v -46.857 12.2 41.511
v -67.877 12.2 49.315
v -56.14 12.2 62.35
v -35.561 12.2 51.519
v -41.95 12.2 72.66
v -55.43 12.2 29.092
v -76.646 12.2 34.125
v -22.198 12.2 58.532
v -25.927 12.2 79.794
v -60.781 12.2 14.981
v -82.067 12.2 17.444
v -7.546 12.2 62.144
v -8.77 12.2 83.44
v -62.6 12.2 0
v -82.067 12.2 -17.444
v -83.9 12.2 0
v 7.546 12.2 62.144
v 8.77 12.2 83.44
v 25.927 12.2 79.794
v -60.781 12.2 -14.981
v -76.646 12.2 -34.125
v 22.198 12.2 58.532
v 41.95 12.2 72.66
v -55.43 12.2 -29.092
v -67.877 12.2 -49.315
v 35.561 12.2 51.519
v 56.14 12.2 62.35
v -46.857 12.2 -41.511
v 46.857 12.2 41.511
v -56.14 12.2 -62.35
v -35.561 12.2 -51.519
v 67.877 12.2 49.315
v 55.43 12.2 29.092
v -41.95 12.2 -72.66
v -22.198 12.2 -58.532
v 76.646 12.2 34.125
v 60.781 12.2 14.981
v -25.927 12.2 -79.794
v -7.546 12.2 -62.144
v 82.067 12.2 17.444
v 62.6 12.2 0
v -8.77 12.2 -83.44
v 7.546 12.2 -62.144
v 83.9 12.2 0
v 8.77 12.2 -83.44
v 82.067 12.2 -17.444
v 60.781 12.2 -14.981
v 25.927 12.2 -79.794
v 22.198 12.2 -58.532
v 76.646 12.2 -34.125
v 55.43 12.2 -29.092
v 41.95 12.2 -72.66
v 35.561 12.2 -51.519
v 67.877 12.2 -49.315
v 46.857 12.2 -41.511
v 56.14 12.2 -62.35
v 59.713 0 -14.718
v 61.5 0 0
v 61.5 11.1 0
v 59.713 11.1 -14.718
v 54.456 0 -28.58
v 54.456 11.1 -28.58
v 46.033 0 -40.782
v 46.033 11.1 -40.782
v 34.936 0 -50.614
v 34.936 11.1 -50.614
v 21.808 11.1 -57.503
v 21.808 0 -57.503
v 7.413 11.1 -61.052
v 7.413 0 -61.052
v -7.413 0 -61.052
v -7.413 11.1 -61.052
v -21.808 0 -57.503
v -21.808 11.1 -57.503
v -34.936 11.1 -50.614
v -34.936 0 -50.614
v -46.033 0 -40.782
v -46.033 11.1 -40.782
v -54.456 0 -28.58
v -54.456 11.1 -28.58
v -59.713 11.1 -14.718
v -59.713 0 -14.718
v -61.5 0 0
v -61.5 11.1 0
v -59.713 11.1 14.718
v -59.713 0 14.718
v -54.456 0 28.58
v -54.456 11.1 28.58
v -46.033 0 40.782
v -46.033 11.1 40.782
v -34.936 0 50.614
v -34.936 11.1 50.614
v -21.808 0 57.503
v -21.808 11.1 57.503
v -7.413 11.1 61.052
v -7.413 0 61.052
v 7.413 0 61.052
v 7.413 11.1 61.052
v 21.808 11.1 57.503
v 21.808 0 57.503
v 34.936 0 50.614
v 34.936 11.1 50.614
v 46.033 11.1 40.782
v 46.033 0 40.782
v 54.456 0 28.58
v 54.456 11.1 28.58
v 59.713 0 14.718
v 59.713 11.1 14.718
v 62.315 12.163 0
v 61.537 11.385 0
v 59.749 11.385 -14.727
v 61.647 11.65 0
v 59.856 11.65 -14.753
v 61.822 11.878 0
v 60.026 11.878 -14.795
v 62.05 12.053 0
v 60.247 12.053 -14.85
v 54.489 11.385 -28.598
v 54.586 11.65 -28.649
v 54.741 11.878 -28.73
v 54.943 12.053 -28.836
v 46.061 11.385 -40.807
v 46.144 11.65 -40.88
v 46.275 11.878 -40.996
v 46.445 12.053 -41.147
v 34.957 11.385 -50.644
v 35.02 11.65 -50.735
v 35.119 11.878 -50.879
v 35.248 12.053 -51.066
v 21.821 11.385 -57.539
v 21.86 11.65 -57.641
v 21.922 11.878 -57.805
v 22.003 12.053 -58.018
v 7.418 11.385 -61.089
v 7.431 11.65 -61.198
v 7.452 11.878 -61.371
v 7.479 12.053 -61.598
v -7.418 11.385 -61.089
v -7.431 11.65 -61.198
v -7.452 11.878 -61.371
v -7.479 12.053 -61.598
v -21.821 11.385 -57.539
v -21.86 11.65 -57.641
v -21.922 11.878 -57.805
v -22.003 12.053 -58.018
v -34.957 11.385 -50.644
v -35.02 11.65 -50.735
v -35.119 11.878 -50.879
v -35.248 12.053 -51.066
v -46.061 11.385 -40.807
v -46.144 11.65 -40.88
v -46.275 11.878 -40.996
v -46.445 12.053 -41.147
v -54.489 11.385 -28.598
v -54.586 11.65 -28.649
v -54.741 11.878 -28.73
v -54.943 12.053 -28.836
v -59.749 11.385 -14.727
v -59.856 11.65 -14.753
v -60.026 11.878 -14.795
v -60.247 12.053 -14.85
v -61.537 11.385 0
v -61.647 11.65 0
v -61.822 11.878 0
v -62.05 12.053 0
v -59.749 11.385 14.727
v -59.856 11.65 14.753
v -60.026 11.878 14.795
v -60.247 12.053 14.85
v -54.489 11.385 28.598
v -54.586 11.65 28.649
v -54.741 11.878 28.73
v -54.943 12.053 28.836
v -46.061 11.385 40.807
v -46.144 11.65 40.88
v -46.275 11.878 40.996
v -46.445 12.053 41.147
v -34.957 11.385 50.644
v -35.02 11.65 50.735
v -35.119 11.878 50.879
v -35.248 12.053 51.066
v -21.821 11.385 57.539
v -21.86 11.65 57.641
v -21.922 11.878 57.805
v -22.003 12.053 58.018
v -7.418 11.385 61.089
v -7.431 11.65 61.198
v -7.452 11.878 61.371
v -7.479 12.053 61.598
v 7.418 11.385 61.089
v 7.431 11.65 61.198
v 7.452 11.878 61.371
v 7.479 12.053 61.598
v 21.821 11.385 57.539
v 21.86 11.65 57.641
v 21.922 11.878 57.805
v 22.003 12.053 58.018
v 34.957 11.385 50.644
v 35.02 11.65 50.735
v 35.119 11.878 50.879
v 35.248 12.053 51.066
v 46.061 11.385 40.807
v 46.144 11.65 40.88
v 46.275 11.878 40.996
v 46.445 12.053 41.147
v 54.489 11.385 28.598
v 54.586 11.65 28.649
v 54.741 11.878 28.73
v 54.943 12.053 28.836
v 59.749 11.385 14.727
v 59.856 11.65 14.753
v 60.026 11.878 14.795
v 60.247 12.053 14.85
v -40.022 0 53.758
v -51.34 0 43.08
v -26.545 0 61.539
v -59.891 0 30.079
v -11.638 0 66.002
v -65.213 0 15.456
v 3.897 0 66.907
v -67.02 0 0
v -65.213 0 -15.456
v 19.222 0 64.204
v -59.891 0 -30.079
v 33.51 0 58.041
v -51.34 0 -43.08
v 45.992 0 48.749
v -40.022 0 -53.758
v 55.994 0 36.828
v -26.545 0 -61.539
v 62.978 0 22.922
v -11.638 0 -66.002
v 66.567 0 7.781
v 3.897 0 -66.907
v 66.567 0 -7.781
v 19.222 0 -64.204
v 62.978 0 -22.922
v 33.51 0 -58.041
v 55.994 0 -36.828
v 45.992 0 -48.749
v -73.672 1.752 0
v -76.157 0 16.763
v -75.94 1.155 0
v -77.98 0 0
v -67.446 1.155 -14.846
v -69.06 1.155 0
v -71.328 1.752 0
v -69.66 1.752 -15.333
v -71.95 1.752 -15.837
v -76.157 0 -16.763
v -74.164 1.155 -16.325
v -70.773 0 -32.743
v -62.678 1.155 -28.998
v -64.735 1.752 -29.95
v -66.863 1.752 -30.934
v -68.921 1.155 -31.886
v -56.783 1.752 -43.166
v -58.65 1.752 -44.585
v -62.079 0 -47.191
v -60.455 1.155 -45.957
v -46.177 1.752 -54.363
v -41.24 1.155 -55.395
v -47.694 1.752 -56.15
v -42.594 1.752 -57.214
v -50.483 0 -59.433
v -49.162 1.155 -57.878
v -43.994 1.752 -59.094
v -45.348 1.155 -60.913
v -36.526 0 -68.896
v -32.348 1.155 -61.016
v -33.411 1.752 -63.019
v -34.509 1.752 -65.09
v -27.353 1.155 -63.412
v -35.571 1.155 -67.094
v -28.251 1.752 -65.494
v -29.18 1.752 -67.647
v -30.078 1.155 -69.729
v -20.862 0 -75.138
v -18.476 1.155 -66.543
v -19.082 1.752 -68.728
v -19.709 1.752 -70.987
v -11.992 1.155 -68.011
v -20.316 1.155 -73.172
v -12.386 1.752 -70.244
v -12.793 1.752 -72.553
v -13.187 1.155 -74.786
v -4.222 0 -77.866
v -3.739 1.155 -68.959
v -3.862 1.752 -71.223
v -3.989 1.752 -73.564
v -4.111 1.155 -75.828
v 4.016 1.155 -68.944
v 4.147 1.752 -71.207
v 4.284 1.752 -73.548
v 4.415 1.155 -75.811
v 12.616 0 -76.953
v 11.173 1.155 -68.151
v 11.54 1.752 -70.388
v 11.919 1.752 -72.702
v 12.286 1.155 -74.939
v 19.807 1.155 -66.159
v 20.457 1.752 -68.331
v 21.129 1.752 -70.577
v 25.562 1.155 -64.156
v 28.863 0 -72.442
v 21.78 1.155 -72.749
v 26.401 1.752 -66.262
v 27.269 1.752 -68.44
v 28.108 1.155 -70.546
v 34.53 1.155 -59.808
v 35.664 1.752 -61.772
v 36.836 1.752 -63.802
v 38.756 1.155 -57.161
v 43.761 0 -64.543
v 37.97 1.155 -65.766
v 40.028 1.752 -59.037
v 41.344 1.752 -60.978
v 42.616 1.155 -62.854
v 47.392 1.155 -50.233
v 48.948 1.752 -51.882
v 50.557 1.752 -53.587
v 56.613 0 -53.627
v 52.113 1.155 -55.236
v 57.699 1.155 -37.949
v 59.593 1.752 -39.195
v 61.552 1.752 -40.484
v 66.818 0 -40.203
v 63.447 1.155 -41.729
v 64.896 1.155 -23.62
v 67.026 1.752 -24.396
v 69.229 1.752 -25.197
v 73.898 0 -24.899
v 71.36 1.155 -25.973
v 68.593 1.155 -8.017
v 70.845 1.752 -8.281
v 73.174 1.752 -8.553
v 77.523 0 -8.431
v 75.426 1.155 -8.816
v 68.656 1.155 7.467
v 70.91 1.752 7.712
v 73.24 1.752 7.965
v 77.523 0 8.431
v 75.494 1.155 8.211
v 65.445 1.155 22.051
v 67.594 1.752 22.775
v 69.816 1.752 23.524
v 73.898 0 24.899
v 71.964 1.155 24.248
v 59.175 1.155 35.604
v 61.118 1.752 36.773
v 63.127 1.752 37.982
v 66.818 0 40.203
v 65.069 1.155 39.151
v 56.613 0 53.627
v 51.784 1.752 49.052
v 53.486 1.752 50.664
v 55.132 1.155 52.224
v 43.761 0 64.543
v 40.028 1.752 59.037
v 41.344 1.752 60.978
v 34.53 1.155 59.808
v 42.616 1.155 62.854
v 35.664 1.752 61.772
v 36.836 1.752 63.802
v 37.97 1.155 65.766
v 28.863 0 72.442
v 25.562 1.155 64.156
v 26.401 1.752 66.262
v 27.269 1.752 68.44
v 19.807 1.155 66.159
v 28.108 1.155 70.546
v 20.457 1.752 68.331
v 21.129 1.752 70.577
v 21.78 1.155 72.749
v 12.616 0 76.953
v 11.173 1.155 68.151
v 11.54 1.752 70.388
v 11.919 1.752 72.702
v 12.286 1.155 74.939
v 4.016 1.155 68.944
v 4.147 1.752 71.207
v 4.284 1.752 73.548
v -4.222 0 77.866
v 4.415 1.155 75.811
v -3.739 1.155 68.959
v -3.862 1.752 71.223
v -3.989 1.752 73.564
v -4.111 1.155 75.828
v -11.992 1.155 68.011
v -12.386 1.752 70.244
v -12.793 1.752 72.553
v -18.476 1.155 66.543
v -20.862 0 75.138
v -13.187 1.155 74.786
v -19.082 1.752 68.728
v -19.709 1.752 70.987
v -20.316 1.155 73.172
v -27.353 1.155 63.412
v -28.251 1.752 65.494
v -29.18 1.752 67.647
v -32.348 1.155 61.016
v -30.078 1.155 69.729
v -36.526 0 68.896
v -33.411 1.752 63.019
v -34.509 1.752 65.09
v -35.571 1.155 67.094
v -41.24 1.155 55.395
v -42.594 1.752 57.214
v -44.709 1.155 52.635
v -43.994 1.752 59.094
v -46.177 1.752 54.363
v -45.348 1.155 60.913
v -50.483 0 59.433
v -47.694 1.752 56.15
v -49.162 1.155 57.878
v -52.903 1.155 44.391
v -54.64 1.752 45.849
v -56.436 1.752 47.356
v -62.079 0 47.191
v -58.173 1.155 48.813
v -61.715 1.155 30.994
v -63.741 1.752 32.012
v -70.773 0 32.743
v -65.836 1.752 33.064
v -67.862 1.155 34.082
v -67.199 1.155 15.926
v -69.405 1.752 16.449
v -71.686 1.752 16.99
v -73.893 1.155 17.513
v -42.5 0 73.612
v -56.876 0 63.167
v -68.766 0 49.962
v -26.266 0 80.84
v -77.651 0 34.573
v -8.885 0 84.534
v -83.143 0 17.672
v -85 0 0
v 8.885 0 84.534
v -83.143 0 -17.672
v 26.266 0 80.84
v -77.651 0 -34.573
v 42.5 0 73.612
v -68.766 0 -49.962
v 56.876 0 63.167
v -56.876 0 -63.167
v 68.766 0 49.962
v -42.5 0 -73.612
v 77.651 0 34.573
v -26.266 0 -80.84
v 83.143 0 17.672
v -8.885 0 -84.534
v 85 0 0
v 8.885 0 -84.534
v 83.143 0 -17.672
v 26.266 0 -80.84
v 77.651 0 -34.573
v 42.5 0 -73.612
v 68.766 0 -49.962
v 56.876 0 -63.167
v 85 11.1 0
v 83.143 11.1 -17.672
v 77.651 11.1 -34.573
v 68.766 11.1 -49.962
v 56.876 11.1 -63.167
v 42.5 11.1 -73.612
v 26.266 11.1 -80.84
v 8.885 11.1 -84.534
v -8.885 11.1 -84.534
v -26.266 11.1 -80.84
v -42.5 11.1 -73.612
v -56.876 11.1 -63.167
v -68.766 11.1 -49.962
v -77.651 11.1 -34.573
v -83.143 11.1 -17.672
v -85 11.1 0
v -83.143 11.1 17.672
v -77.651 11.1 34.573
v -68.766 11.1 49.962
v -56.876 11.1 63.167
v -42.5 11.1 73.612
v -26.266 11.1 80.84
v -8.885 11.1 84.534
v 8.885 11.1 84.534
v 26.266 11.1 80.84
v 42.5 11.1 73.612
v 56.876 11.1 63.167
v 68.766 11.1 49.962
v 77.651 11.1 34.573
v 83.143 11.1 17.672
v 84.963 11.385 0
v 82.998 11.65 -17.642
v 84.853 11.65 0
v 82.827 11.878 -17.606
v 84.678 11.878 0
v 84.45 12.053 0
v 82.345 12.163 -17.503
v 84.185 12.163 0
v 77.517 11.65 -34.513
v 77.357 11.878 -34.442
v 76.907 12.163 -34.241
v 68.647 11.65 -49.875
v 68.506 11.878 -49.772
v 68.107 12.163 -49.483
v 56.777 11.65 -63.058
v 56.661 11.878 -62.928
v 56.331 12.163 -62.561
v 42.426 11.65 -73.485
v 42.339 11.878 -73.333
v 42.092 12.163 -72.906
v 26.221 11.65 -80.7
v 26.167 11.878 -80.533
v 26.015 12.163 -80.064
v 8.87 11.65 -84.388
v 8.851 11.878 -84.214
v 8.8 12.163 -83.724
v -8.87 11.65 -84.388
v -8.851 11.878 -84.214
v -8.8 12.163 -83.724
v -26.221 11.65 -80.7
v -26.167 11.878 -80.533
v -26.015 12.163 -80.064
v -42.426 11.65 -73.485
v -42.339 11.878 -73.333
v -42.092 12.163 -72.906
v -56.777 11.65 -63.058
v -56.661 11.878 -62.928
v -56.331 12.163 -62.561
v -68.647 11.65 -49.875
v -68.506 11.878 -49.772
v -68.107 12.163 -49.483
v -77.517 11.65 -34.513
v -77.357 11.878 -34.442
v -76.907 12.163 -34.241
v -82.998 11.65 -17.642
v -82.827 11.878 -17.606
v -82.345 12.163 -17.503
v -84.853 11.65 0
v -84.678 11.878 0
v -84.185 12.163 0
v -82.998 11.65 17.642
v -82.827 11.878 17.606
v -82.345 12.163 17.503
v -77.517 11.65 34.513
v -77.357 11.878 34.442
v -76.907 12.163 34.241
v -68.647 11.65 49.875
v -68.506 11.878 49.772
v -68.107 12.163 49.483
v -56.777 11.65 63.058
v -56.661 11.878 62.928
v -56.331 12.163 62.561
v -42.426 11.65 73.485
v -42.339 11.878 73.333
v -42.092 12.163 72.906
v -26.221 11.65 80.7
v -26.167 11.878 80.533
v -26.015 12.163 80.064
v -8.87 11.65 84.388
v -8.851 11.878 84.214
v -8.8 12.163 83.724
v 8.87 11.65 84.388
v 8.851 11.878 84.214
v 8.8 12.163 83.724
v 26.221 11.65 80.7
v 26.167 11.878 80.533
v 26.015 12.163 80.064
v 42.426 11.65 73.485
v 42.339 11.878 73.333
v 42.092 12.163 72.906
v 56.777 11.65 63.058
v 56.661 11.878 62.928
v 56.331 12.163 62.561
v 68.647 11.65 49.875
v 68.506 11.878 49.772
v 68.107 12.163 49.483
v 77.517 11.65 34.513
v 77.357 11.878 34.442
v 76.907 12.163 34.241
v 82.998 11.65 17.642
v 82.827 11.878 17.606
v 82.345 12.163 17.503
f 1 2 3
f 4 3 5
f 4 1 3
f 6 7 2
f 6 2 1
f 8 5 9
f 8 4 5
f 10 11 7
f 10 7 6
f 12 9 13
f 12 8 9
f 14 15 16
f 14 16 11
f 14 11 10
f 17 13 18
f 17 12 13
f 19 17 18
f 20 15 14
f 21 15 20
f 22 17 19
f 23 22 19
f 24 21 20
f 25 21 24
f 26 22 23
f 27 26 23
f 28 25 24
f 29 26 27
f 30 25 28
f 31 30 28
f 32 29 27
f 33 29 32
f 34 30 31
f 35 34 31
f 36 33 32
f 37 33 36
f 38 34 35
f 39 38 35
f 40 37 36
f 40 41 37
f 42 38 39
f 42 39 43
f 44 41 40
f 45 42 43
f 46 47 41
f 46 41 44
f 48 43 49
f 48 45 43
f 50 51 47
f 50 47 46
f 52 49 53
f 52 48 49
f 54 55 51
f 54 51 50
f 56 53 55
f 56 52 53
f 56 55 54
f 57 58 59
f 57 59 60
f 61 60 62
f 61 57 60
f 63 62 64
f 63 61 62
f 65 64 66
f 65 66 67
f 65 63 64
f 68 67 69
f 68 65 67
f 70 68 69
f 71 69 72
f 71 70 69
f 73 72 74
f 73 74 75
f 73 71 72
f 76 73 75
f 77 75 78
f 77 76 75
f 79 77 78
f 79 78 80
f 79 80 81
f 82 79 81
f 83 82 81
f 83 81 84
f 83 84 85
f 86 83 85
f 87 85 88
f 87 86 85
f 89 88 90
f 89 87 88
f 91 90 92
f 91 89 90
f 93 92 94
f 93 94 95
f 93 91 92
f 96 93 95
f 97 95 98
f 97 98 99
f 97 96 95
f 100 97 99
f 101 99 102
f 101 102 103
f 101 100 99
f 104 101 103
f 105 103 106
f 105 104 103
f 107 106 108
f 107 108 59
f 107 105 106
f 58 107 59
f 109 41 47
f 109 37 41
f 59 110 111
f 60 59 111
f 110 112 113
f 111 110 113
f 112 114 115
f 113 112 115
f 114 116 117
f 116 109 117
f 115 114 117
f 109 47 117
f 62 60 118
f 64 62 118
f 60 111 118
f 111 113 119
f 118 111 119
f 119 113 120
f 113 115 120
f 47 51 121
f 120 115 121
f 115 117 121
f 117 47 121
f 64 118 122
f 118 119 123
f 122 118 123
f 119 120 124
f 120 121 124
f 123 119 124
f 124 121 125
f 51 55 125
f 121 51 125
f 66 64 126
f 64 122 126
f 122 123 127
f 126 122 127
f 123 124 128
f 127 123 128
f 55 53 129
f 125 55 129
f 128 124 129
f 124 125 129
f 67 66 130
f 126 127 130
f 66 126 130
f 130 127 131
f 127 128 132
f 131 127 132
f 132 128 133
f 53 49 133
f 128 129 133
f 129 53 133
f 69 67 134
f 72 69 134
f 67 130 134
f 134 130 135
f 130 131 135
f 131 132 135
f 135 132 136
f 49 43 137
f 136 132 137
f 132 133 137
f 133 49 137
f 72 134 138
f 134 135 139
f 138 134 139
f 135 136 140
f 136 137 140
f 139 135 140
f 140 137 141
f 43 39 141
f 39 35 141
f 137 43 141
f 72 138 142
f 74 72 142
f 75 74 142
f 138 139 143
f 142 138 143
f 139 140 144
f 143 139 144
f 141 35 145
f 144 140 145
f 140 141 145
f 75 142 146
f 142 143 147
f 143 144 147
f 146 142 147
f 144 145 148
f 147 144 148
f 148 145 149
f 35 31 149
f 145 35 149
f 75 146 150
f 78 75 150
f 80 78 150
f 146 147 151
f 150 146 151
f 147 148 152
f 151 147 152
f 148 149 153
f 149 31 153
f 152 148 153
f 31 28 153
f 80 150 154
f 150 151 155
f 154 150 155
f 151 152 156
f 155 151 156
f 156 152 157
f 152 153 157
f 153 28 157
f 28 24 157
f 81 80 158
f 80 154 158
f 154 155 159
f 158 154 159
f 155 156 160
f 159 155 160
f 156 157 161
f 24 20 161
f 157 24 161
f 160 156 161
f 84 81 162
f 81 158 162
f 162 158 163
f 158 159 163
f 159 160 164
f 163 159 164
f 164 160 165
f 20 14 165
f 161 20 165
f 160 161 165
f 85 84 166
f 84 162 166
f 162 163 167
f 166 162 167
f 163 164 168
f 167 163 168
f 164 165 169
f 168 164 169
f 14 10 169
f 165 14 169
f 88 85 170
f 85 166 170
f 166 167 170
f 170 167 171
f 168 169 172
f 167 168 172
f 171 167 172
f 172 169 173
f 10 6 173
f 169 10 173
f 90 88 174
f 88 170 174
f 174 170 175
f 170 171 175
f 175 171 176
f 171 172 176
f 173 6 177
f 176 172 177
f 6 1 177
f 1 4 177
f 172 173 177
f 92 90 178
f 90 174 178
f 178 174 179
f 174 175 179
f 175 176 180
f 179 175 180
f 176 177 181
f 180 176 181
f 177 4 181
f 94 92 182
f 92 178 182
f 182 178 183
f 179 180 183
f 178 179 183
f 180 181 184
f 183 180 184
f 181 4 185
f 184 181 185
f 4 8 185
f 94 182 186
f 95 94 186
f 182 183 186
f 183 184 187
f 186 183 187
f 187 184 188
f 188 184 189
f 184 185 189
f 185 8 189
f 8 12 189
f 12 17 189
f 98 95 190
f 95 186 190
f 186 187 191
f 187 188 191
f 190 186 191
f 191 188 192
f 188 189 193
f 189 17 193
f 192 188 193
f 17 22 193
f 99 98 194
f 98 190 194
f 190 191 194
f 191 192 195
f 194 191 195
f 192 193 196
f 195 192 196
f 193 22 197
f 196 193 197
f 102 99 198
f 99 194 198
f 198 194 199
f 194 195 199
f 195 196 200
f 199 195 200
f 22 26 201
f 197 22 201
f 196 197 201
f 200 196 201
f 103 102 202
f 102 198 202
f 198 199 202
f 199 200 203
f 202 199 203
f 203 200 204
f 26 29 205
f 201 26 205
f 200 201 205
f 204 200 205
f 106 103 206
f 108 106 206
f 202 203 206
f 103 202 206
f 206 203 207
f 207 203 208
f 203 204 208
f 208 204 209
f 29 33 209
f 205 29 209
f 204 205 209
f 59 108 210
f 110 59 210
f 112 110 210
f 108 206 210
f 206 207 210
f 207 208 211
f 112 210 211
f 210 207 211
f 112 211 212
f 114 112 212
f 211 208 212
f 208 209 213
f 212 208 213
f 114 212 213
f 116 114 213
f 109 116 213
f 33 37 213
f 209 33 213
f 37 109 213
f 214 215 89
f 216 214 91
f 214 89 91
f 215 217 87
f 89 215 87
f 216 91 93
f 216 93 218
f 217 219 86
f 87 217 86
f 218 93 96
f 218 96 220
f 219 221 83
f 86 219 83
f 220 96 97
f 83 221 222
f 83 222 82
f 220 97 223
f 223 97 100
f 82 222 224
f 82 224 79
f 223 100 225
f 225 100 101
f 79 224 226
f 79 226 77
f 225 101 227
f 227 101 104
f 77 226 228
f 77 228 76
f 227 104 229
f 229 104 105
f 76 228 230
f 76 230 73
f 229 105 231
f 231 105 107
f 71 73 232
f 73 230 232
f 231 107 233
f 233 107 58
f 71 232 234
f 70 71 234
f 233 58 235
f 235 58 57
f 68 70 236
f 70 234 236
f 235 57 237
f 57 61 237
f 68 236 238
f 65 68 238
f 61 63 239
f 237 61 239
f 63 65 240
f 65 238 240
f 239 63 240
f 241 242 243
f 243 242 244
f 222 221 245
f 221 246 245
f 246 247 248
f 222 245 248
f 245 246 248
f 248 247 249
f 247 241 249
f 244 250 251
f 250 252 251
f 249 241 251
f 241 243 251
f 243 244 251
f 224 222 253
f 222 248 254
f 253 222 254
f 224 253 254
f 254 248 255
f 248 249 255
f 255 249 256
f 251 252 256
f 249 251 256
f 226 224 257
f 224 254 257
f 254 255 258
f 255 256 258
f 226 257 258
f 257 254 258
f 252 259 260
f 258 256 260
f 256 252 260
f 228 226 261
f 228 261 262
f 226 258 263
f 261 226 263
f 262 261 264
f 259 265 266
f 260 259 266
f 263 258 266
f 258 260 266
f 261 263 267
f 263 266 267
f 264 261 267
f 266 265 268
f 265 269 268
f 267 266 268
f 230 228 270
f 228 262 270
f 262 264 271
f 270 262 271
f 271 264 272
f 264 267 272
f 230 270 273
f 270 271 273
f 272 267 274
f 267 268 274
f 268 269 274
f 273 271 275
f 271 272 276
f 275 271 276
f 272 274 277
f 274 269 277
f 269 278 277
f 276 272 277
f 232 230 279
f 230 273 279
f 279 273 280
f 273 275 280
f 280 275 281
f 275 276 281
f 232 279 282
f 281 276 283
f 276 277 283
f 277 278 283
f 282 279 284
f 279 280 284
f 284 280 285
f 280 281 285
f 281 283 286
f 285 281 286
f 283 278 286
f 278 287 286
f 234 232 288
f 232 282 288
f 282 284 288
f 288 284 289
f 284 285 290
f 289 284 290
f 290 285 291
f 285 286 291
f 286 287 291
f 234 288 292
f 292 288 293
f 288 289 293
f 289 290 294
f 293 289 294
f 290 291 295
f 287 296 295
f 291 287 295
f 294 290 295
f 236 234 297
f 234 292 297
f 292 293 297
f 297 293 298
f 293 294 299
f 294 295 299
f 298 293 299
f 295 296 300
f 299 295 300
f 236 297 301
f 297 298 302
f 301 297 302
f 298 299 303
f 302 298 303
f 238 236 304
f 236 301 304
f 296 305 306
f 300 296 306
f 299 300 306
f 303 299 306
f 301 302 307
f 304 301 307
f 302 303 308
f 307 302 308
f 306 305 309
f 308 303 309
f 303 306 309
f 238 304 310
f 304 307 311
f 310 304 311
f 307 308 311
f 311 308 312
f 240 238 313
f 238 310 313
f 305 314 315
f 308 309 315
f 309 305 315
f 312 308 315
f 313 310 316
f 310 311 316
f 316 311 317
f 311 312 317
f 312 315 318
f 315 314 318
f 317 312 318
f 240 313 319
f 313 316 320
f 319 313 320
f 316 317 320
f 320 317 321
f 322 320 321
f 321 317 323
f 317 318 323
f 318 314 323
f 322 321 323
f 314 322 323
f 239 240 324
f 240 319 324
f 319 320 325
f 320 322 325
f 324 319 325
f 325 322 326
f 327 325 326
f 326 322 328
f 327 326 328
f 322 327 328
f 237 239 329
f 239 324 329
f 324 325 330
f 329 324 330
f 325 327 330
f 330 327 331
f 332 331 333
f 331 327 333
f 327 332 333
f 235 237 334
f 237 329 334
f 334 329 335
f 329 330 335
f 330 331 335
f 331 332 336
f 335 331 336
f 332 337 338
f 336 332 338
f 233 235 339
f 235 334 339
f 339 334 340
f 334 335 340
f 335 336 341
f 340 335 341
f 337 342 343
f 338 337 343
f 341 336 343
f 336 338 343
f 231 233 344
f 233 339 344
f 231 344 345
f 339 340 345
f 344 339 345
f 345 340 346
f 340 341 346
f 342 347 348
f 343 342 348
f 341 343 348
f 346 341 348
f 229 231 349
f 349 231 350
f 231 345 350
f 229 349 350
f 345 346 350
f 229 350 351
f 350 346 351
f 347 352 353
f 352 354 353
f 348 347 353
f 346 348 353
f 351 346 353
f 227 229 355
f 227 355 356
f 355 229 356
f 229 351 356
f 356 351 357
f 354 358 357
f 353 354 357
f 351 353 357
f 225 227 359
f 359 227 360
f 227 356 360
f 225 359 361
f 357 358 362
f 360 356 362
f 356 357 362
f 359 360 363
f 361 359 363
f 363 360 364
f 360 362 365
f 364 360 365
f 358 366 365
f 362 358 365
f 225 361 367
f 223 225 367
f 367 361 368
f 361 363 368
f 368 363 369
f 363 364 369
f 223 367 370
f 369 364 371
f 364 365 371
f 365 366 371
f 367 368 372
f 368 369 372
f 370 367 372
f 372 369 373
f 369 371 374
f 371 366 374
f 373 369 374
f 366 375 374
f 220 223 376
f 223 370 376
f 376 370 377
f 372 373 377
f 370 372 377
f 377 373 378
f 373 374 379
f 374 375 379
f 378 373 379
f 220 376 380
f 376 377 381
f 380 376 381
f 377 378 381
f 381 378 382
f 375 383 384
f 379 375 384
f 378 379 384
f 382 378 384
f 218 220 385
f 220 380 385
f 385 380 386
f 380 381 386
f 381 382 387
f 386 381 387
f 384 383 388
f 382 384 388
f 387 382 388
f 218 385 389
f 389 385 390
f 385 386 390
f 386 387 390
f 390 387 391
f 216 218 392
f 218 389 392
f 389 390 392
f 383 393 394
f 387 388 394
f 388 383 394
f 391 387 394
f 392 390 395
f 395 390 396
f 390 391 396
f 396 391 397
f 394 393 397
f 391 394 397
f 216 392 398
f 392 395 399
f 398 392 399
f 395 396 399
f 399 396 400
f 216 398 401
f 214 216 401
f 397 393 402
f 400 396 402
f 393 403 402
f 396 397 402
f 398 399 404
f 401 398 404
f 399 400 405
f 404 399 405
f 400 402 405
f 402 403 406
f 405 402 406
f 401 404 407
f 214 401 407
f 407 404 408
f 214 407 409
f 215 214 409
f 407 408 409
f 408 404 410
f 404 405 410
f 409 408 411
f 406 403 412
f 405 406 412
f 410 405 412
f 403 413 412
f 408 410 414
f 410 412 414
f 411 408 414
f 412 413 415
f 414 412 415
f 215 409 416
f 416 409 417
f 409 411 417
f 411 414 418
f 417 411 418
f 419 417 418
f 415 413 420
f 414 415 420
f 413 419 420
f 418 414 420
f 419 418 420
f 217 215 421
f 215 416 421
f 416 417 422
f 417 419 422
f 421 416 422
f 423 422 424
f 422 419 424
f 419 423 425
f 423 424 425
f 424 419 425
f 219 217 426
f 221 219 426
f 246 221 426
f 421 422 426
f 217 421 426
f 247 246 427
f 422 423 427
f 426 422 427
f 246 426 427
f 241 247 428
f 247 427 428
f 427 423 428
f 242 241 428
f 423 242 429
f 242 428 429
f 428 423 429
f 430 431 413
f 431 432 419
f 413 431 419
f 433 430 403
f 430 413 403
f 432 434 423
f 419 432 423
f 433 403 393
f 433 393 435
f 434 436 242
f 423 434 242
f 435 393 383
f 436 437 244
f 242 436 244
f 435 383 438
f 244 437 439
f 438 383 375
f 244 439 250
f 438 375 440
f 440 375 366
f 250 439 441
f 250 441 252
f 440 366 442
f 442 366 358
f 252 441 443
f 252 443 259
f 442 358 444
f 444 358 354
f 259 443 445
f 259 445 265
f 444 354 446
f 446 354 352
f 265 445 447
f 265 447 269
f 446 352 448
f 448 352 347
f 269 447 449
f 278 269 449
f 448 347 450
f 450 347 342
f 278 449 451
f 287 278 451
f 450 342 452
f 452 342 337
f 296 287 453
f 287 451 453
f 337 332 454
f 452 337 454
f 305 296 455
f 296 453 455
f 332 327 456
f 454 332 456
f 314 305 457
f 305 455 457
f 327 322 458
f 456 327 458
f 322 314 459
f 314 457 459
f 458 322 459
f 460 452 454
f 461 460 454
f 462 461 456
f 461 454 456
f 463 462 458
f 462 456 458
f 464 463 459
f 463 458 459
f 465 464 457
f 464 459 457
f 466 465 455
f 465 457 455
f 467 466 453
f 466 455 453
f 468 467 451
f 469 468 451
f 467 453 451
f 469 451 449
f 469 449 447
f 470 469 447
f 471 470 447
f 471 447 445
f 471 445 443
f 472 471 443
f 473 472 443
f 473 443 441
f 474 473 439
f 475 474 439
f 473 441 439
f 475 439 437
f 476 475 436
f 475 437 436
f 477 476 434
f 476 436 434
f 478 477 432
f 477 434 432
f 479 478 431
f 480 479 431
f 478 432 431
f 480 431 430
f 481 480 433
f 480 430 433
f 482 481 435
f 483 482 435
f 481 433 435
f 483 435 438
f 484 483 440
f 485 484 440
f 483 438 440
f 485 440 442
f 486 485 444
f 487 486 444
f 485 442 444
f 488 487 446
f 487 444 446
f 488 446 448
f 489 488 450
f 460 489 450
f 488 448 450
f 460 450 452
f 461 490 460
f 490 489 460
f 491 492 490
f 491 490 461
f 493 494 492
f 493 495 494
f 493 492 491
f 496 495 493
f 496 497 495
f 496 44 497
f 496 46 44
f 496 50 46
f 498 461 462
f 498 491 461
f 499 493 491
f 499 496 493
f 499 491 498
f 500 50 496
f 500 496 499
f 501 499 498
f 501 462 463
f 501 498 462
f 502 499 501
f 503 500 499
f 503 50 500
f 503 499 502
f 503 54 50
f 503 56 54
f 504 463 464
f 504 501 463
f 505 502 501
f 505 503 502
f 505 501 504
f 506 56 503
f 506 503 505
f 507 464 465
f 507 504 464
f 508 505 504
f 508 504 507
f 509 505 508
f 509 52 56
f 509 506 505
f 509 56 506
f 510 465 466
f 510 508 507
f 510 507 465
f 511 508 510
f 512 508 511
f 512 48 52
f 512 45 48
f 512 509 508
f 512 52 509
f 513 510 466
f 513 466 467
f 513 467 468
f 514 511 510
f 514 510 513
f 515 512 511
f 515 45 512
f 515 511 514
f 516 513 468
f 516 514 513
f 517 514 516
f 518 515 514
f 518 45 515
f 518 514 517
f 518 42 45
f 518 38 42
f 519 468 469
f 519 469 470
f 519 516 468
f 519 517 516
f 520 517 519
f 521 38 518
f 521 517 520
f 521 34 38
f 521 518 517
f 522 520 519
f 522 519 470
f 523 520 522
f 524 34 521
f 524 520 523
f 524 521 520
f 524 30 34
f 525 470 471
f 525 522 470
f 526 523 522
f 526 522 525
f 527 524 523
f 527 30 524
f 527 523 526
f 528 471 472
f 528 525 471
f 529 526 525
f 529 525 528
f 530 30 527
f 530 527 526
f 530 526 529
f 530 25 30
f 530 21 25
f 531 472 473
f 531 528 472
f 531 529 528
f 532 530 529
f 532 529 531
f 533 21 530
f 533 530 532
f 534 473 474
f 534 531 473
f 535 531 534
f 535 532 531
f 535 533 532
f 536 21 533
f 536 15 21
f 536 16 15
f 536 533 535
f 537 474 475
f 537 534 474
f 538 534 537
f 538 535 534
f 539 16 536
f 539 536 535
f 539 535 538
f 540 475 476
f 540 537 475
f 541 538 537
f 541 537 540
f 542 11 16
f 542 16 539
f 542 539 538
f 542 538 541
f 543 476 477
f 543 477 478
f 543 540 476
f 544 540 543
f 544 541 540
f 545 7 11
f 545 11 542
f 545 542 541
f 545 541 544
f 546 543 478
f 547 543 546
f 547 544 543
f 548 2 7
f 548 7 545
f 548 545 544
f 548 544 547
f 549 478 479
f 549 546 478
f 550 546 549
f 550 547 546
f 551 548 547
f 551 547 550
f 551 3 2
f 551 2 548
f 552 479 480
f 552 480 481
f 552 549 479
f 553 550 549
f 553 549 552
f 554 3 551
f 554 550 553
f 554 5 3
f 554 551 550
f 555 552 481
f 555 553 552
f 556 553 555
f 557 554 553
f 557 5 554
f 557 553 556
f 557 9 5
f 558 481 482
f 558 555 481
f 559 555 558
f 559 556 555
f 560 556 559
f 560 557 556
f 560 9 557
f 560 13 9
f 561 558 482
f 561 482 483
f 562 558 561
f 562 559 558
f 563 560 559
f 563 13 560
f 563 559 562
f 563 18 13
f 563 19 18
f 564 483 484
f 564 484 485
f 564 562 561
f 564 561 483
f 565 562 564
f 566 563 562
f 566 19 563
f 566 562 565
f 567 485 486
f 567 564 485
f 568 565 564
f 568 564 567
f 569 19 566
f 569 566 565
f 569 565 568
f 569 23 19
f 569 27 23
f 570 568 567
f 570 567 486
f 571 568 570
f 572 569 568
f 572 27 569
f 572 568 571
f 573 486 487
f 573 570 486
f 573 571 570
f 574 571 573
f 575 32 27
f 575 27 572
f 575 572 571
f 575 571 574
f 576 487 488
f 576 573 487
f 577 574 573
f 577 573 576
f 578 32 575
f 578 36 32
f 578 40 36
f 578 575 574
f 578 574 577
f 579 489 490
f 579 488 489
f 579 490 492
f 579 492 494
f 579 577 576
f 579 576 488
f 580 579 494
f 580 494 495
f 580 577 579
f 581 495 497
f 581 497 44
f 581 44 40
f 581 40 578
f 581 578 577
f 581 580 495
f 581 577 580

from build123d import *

# Parameters (mm, degrees)
SKETCH1_R           = 85
SKETCH1_R_2         = 61.5
BOSS_EXTRUDE1_DEPTH = 12.2
FILLET1_R           = 1.1


with BuildPart() as part:
    # Sketch1 → Boss-Extrude1 (new body)
    with BuildSketch(Plane(origin=(0, 0, 0), x_dir=(1, 0, 0), z_dir=(0, 1, 0))):
        Circle(SKETCH1_R)
        Circle(SKETCH1_R_2, mode=Mode.SUBTRACT)
    extrude(amount=BOSS_EXTRUDE1_DEPTH)

    # Fillet1
    fillet1_edges = [part.edges().sort_by_distance(p)[0] for p in [
        (-85, 12.2, 0),
        (-61.5, 12.2, 0),
    ]]
    fillet(fillet1_edges, radius=FILLET1_R)

    # Sketch2 → Cut-Revolve1 (revolve, cut)
    with BuildSketch(Plane.XY):
        with BuildLine():
            Line((-77.98, 0), (-67.02, 0))
            ThreePointArc((-67.02, 0), (-72.5, 1.827500428), (-77.98, 0))
        make_face()
    revolve(axis=Axis((0, 11.1, 0), (0, -1, 0)), mode=Mode.SUBTRACT)


solid = part.part
